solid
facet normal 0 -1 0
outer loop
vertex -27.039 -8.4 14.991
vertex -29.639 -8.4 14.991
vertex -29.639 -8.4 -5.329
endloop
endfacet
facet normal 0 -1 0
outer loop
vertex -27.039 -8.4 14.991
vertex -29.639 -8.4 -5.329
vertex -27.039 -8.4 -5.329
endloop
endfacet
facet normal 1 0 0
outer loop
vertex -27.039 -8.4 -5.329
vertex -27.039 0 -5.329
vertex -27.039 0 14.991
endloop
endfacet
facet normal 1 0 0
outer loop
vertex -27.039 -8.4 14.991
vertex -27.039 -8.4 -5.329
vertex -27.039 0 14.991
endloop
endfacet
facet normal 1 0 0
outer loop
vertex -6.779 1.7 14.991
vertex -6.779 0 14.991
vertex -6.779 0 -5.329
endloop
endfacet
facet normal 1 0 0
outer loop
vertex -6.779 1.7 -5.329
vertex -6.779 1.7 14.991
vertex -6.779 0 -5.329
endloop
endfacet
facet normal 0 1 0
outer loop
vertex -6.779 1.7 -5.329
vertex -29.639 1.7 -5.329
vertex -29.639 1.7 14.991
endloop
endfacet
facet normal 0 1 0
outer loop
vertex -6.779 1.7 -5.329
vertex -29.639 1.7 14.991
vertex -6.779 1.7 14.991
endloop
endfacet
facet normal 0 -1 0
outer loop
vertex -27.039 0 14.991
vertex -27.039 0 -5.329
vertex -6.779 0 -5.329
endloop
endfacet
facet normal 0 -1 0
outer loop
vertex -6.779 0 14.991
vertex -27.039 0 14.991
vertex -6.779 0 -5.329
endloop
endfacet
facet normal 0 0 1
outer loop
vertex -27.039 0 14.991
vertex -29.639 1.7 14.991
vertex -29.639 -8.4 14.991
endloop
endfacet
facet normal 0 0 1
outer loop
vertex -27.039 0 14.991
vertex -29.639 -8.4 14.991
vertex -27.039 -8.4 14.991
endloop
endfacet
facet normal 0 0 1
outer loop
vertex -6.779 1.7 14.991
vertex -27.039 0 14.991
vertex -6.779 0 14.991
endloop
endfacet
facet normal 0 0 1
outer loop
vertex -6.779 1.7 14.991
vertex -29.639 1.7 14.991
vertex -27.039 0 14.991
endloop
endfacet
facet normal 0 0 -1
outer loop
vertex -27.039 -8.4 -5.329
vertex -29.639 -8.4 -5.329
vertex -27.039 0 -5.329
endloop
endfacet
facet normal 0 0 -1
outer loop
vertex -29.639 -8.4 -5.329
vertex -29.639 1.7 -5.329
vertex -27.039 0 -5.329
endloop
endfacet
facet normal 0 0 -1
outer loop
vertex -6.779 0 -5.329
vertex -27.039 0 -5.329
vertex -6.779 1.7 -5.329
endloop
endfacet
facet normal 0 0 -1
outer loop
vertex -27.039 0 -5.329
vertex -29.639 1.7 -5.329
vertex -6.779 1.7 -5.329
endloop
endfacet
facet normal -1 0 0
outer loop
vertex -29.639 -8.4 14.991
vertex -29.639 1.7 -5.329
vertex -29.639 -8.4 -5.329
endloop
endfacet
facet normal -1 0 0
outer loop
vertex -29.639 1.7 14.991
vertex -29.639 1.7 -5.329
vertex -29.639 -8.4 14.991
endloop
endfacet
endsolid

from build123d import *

# Parameters (mm, degrees)
SKETCH1_W      = 22.86
SKETCH1_H      = 20.32
EXTRUDE1_DEPTH = 1.7
SKETCH2_W      = 2.6
SKETCH2_H      = 20.32
EXTRUDE2_DEPTH = 8.4


with BuildPart() as part:
    # Sketch1 → Extrude1 (new body)
    with BuildSketch(Plane(origin=(0, 0, 0), x_dir=(1, 0, 0), z_dir=(0, 1, 0))):
        with Locations((-18.208858156, -4.831082697)):
            Rectangle(SKETCH1_W, SKETCH1_H)
    extrude(amount=EXTRUDE1_DEPTH)

    # Sketch2 → Extrude2 (add)
    with BuildSketch(Plane.XZ):
        with Locations((-28.338858156, 4.831082697)):
            Rectangle(SKETCH2_W, SKETCH2_H)
    extrude(amount=EXTRUDE2_DEPTH)


solid = part.part
